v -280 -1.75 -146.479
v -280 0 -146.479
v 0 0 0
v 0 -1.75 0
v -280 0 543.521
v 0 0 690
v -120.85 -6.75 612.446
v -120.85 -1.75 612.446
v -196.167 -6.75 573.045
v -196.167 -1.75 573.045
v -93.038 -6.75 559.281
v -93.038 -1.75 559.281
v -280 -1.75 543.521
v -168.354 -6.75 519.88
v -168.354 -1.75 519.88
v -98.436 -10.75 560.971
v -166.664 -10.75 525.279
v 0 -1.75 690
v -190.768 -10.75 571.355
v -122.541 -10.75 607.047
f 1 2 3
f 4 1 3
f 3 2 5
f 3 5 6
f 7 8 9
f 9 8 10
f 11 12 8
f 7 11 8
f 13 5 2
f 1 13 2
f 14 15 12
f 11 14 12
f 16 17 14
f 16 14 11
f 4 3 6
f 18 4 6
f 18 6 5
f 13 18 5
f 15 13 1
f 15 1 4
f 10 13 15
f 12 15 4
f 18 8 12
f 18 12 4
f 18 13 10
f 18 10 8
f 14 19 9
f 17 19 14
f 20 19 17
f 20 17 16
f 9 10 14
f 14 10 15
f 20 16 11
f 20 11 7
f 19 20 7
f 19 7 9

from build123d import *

# Parameters (mm, degrees)
F1_DEPTH = 1.75
F3_DEPTH = 9
F4_SIZE  = 4


with BuildPart() as f1:
    # F0 (on Front) → F1 (new body)
    with BuildSketch(Plane.XZ):
        Polygon((0, 690), (-280, 543.521333), (-280, -146.478667), (0, 0), align=None)
    extrude(amount=F1_DEPTH)

    # F2 (on face) → F3 (join)
    with BuildSketch(Plane.XZ.offset(1.75)):
        Polygon((-120.85038, 612.445705), (-196.166836, 573.044798), (-168.35443, 519.880241), (-93.037975, 559.281148), align=None)
    extrude(amount=F3_DEPTH)

    # F4
    f4_edges = [f1.edges().sort_by_distance(p)[0] for p in [
        (-106.944177, -10.75, 585.863427),
        (-158.508608, -10.75, 592.745251),
        (-182.260633, -10.75, 546.462519),
        (-130.696203, -10.75, 539.580694),
    ]]
    chamfer(f4_edges, length=F4_SIZE)


solid = f1.part
